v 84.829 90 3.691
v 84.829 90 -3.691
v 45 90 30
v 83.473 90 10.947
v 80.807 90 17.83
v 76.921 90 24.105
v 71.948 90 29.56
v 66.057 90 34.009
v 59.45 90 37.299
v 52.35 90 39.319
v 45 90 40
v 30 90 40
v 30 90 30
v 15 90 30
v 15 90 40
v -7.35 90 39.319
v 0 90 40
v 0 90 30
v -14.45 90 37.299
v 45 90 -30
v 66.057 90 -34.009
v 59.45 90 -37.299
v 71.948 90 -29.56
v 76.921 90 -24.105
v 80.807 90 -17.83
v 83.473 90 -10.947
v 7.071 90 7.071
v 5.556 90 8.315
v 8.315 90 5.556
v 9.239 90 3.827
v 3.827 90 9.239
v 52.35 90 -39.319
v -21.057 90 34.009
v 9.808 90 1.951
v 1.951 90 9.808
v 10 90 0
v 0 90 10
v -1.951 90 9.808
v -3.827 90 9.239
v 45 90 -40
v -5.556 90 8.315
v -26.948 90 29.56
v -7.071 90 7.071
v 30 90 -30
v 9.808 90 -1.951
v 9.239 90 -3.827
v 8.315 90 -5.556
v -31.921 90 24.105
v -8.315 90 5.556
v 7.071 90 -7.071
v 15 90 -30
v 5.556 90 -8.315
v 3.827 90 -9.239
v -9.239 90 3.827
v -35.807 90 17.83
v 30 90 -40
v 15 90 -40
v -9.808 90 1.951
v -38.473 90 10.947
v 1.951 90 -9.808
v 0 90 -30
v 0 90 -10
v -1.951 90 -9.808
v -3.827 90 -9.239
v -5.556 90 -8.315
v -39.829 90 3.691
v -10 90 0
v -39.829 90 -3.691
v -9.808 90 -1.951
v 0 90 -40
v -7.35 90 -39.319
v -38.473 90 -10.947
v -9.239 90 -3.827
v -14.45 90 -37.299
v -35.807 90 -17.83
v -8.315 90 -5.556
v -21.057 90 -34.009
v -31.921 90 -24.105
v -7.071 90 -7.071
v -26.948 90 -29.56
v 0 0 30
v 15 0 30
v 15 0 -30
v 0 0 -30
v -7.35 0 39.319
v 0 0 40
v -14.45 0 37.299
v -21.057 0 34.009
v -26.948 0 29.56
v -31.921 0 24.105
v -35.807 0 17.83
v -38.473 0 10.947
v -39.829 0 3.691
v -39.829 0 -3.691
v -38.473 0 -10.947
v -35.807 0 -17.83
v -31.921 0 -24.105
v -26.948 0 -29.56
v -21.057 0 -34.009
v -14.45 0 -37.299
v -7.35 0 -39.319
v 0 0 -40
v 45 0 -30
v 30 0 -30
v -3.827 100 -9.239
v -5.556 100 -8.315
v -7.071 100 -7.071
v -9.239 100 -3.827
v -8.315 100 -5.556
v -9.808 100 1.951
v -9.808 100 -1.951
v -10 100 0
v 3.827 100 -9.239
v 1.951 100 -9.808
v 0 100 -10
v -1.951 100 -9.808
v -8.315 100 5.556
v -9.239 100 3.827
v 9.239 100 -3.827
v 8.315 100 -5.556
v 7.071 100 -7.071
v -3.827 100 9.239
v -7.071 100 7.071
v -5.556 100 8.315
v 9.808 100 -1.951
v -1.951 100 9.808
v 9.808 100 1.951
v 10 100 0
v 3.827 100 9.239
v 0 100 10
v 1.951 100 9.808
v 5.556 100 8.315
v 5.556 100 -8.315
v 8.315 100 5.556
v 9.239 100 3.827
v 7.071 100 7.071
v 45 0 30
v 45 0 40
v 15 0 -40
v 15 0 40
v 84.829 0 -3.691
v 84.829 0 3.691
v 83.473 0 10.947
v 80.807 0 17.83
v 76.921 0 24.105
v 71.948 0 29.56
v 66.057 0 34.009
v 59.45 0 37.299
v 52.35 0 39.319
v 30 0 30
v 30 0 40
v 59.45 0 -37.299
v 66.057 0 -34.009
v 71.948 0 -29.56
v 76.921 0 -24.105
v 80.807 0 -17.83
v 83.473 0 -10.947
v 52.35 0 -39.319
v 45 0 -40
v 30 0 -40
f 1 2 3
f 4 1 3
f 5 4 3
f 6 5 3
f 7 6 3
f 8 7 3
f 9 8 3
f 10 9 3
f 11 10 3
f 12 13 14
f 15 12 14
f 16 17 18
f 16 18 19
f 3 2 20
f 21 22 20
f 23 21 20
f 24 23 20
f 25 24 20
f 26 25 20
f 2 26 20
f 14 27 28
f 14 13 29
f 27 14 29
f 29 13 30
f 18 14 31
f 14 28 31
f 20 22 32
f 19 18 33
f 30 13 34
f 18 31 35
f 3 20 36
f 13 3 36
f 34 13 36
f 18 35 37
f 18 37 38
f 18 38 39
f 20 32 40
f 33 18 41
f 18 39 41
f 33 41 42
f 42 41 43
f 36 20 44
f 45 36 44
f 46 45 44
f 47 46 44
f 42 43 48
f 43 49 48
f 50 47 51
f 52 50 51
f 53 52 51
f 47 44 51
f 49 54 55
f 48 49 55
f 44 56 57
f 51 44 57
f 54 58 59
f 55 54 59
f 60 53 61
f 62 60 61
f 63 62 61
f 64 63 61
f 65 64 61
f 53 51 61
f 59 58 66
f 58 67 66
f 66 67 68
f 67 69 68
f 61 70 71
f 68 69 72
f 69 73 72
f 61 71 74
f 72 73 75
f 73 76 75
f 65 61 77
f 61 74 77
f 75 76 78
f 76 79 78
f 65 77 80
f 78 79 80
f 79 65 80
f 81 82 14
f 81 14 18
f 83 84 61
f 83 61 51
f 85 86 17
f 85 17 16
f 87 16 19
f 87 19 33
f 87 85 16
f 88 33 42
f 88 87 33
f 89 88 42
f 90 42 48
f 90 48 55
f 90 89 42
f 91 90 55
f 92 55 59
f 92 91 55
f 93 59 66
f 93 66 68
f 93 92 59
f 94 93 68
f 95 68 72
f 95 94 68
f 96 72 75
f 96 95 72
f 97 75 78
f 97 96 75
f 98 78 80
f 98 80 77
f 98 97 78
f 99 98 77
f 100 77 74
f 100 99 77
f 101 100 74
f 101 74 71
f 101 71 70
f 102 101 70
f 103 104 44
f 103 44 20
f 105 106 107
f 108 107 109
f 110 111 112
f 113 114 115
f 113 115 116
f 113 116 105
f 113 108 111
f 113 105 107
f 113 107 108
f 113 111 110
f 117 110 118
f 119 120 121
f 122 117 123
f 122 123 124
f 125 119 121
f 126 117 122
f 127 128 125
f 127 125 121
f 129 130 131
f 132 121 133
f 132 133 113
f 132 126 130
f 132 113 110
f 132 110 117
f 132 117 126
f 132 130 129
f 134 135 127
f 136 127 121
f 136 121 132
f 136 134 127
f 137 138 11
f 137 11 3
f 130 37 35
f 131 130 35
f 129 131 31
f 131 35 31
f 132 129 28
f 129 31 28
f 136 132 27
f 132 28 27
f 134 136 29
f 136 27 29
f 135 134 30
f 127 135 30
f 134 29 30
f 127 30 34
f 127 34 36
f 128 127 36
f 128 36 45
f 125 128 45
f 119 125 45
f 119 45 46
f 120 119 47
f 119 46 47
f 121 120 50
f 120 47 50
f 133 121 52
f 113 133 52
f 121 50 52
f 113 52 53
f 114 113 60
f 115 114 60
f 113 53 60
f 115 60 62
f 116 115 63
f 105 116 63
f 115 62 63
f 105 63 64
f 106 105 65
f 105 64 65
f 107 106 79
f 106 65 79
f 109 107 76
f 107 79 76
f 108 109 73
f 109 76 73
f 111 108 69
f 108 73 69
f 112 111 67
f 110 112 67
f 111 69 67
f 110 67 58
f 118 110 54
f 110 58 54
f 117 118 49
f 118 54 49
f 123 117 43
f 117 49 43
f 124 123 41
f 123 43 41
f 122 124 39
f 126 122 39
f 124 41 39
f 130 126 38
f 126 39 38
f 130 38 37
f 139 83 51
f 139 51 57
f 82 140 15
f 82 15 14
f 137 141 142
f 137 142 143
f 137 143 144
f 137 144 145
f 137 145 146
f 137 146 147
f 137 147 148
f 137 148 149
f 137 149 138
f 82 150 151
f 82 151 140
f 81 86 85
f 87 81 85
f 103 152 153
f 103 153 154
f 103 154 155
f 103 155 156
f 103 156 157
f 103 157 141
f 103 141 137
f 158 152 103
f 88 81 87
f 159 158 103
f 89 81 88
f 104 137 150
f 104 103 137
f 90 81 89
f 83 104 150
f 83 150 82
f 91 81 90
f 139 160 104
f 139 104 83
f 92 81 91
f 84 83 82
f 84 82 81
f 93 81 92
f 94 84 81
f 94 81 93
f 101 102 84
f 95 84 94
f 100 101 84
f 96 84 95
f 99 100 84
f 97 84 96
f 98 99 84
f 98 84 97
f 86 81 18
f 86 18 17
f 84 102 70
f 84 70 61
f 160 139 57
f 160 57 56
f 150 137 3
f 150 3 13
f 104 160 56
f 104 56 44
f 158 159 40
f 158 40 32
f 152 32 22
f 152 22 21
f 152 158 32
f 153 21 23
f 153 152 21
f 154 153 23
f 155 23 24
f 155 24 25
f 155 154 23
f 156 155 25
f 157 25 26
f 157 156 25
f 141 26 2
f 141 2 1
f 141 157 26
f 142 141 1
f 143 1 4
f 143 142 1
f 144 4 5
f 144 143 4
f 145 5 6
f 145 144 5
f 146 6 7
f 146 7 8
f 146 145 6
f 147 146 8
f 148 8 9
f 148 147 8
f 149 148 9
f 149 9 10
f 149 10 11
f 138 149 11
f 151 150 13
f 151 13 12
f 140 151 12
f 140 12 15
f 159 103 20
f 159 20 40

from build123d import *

# Parameters (mm, degrees)
EXTRUDE1_DEPTH = 90
SKETCH2_R      = 10
EXTRUDE2_DEPTH = 10


with BuildPart() as part:
    # Sketch1 → Extrude1 (new body)
    with BuildSketch(Plane(origin=(0, 0, 0), x_dir=(1, 0, 0), z_dir=(0, 1, 0))):
        with BuildLine():
            Line((0, 40), (0, 30))
            Line((0, 30), (15, 30))
            Line((15, 30), (15, 40))
            Line((15, 40), (30, 40))
            Line((30, 40), (30, 30))
            Line((30, 30), (45, 30))
            Line((45, 30), (45, 40))
            ThreePointArc((45, 40), (85, 0), (45, -40))
            Line((45, -40), (45, -30))
            Line((45, -30), (30, -30))
            Line((30, -30), (30, -40))
            Line((30, -40), (15, -40))
            Line((15, -40), (15, -30))
            Line((15, -30), (0, -30))
            Line((0, -30), (0, -40))
            ThreePointArc((0, -40), (-40, 0), (0, 40))
        make_face()
    extrude(amount=EXTRUDE1_DEPTH)

    # Sketch2 → Extrude2 (add)
    with BuildSketch(Plane(origin=(0, 90, 0), x_dir=(-1, 0, 0), z_dir=(0, 1, 0))):
        with Locations(Location((0, 0, 0), (0, 0, 90))):  # turned: the seam where the file's is
            Circle(SKETCH2_R)
    extrude(amount=EXTRUDE2_DEPTH)


solid = part.part
